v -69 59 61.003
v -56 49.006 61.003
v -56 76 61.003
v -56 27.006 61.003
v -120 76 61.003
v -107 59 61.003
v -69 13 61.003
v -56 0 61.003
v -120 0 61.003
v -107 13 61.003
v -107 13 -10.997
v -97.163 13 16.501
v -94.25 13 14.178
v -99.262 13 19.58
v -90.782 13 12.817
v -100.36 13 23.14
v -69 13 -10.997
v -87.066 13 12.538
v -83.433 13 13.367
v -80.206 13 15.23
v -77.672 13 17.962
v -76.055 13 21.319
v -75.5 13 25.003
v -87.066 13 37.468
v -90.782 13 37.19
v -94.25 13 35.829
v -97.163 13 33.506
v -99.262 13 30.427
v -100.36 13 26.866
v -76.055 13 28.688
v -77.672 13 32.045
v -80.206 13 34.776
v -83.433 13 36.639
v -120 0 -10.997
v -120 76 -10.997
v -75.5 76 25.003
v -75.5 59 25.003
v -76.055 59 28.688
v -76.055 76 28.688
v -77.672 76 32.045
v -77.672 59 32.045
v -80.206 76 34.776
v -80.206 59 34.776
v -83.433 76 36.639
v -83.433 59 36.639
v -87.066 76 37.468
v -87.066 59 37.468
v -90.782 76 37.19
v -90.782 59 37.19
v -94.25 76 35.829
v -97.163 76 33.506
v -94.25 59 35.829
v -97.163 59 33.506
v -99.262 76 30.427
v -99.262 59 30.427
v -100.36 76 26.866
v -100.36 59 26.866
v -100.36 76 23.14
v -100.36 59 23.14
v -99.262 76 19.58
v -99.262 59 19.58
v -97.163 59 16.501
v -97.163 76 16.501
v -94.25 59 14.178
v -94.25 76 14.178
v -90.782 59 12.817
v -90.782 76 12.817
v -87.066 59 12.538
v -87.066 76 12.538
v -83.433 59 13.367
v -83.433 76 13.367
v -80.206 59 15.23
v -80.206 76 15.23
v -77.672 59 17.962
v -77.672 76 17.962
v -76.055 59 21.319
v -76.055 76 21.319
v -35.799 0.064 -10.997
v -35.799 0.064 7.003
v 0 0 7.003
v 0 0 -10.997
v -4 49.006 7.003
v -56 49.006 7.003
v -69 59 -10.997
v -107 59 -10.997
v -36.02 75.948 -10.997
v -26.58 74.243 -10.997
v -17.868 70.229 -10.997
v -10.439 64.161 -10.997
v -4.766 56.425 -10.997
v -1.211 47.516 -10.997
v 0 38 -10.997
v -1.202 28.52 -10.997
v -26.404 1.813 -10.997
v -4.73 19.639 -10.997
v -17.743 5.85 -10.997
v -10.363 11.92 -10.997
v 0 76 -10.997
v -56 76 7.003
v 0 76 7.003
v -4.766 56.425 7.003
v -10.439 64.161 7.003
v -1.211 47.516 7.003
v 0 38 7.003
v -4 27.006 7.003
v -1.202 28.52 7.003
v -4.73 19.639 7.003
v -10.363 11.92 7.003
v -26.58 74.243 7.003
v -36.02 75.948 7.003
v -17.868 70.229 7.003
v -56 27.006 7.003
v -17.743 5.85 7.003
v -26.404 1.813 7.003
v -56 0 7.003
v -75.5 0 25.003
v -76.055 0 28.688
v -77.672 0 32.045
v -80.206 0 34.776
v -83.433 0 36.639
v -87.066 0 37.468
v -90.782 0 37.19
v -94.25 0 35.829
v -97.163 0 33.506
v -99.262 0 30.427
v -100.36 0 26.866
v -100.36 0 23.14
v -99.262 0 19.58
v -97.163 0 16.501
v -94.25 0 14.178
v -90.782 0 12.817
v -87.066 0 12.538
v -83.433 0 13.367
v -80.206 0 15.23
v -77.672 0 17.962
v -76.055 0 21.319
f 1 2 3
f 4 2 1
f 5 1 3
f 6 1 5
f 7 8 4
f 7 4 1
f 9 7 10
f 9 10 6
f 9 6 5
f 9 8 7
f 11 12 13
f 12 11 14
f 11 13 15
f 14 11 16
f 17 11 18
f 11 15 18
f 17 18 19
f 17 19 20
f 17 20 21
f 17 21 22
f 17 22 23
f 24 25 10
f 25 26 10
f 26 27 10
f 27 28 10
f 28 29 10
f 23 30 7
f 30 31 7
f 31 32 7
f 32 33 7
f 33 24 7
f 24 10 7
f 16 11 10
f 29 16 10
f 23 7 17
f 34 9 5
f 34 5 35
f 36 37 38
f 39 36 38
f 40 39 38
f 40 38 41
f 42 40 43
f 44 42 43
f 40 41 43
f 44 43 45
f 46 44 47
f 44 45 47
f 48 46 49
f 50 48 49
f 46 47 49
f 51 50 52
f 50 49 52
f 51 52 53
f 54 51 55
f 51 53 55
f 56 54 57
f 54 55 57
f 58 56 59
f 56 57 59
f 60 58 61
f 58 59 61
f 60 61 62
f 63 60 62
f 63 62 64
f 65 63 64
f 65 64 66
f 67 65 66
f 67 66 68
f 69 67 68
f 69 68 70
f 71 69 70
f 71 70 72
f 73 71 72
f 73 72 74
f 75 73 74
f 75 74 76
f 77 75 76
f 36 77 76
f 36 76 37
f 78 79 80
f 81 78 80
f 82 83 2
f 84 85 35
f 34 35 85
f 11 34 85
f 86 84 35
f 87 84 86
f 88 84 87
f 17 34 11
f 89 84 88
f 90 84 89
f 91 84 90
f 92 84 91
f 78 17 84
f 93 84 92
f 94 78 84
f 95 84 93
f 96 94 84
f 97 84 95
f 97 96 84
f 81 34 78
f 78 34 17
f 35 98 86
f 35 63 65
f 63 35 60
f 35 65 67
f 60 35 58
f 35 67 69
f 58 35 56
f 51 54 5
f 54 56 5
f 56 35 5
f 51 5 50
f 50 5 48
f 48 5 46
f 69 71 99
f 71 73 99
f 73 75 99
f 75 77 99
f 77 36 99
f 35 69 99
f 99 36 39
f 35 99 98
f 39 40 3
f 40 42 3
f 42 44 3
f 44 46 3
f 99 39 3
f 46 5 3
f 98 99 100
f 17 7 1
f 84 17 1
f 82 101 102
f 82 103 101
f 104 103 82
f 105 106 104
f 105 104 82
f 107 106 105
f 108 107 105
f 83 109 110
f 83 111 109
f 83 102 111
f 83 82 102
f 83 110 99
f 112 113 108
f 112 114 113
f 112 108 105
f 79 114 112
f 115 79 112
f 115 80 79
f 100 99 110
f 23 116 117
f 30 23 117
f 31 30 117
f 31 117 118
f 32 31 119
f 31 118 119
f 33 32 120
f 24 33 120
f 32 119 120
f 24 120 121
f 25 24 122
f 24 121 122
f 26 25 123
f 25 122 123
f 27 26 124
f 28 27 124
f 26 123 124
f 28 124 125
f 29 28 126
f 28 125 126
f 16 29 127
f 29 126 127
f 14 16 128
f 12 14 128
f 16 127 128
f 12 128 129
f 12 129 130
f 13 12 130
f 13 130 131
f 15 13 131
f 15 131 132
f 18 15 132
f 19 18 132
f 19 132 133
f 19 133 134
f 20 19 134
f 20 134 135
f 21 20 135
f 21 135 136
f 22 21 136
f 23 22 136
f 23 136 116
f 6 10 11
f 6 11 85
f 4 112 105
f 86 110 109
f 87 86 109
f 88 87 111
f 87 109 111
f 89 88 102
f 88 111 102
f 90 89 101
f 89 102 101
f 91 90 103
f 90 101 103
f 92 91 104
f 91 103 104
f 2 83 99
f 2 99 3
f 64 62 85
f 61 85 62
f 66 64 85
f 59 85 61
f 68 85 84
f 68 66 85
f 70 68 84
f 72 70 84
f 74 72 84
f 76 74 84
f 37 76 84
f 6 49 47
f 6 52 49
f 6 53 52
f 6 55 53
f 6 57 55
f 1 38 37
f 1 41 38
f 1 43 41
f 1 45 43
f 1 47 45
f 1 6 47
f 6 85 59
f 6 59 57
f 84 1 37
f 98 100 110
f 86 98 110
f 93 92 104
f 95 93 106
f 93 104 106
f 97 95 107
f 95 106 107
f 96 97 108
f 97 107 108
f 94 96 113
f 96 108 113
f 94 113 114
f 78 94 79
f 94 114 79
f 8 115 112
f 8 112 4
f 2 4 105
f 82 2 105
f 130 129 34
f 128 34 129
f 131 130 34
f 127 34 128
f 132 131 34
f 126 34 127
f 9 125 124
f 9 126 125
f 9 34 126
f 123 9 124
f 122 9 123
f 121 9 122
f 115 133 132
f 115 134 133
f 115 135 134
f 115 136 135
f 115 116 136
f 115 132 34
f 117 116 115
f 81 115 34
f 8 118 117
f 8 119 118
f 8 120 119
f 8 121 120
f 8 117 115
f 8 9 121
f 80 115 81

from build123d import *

# Parameters (mm, degrees)
F0_R      = 12.5
F1_DEPTH  = 76
F2_W      = 38
F2_H      = 46
F3_DEPTH  = 177
F5_DEPTH  = 67
F6_DEPTH  = 65
F7_W      = 51.9999994738
F7_H      = 11
F8_DEPTH  = 54
F10_DEPTH = 64


with BuildPart() as f1:
    # F0 (on Front) → F1 (new body)
    with BuildSketch(Plane.XZ):
        Polygon((-120, -10.9966229647), (0, -10.9966229647), (0, 7.0033770353), (-56, 7.0033770353), (-56, 61.0033770353), (-120, 61.0033770353), align=None)
        with Locations((-88, 25.0033770353)):
            Circle(F0_R, mode=Mode.SUBTRACT)
    extrude(amount=-F1_DEPTH)

    # F2 (on face) → F3 (cut)
    with BuildSketch(Plane.XY.offset(61.0033770353)):
        with Locations((-88, 36)):
            Rectangle(F2_W, F2_H)
    extrude(amount=-F3_DEPTH, mode=Mode.SUBTRACT)

    # F4 (on face) → F5 (cut)
    with BuildSketch(Plane.XY.offset(7.0033770353)):
        with BuildLine():
            ThreePointArc((-36.0197160629, 75.9483659138), (-10.4386975125, 64.1605543748), (0, 38))
            Line((0, 38), (0, 76))
            Line((0, 76), (-36.0197160629, 75.9483659138))
        make_face()
    extrude(amount=-F5_DEPTH, mode=Mode.SUBTRACT)

    # F4 (on face) → F6 (cut)
    with BuildSketch(Plane.XY.offset(7.0033770353)):
        with BuildLine():
            ThreePointArc((-36.0197160629, 75.9483659138), (-10.4386975125, 64.1605543748), (0, 38))
            Line((0, 38), (0, 76))
            Line((0, 76), (-36.0197160629, 75.9483659138))
        make_face()
        with BuildLine():
            ThreePointArc((0, 38), (-10.3625564741, 11.9198980955), (-35.7985113343, 0.0638240244))
            Line((-35.7985113343, 0.0638240244), (0, 0))
            Line((0, 0), (0, 38))
        make_face()
    extrude(amount=-F6_DEPTH, mode=Mode.SUBTRACT)

    # F7 (on face) → F8 (join)
    with BuildSketch(Plane.XY.offset(7.0033770353)):
        with Locations((-30.0000002631, 32.5063240244)):
            Rectangle(F7_W, F7_H)
        with Locations((-30.0000002631, 43.5063240244)):
            Rectangle(F7_W, F7_H)
    extrude(amount=F8_DEPTH)

    # F9 (on face) → F10 (cut)
    with BuildSketch(Plane.XZ.offset(-27.0063240244)):
        Polygon((-56, 61.0033770353), (-4.0000005262, 7.0033770353), (-4.0000005262, 61.0033770353), align=None)
    extrude(amount=-F10_DEPTH, mode=Mode.SUBTRACT)


solid = f1.part
